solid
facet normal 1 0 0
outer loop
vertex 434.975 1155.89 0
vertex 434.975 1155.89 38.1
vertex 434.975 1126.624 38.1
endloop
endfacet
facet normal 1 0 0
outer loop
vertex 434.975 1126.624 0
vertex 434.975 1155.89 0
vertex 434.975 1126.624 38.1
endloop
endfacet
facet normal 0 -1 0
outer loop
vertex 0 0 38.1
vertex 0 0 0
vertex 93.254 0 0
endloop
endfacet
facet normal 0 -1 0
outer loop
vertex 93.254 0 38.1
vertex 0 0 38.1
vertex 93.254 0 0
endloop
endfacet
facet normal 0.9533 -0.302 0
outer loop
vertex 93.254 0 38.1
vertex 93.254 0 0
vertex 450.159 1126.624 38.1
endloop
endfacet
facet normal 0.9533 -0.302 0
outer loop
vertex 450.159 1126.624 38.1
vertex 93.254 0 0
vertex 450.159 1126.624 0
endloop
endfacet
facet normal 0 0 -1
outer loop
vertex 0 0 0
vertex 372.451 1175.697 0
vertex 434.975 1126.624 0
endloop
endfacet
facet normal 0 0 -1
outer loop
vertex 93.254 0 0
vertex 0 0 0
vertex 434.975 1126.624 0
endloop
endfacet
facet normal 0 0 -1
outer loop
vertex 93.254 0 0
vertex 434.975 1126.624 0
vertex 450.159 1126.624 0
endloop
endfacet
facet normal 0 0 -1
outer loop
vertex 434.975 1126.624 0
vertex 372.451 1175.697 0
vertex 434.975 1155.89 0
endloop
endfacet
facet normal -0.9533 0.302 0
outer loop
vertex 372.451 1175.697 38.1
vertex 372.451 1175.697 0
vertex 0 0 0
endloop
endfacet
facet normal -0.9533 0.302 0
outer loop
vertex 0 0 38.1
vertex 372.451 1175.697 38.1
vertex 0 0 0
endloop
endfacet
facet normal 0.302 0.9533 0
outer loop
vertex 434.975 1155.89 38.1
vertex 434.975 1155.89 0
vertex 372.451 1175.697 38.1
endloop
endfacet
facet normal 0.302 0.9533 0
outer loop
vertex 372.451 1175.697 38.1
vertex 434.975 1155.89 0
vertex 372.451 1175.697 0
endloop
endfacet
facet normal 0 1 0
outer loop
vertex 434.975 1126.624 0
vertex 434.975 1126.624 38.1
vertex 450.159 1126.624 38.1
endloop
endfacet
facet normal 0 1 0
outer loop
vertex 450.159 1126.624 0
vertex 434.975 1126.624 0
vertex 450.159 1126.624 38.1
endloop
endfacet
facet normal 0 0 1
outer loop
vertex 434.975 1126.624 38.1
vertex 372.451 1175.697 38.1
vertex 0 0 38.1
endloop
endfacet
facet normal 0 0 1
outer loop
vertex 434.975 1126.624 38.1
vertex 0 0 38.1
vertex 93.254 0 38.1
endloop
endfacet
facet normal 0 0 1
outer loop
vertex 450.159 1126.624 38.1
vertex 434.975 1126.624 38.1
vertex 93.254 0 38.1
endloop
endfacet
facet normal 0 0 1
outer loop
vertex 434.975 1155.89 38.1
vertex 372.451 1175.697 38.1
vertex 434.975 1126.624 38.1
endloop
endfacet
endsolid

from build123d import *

# Parameters (mm, degrees)
BOSS_EXTRUDE1_DEPTH = 38.1
CUT_EXTRUDE1_DEPTH  = 39.1


with BuildPart() as part:
    # Sketch2 → Boss-Extrude1 (new body)
    with BuildSketch(Plane.XY):
        Polygon((0, 0), (93.254232292, 0), (457.2, 1148.849141334), (372.450924213, 1175.696937394), align=None)
    extrude(amount=BOSS_EXTRUDE1_DEPTH)

    # Sketch3 → Cut-Extrude1 (cut, through all)
    with BuildSketch(Plane.XY.offset(38.1)):
        Polygon((434.975, 1126.624141334), (450.159306495, 1126.624141334), (457.2, 1148.849141334), (434.975, 1155.889834839), align=None)
    extrude(amount=-CUT_EXTRUDE1_DEPTH, mode=Mode.SUBTRACT)


solid = part.part
